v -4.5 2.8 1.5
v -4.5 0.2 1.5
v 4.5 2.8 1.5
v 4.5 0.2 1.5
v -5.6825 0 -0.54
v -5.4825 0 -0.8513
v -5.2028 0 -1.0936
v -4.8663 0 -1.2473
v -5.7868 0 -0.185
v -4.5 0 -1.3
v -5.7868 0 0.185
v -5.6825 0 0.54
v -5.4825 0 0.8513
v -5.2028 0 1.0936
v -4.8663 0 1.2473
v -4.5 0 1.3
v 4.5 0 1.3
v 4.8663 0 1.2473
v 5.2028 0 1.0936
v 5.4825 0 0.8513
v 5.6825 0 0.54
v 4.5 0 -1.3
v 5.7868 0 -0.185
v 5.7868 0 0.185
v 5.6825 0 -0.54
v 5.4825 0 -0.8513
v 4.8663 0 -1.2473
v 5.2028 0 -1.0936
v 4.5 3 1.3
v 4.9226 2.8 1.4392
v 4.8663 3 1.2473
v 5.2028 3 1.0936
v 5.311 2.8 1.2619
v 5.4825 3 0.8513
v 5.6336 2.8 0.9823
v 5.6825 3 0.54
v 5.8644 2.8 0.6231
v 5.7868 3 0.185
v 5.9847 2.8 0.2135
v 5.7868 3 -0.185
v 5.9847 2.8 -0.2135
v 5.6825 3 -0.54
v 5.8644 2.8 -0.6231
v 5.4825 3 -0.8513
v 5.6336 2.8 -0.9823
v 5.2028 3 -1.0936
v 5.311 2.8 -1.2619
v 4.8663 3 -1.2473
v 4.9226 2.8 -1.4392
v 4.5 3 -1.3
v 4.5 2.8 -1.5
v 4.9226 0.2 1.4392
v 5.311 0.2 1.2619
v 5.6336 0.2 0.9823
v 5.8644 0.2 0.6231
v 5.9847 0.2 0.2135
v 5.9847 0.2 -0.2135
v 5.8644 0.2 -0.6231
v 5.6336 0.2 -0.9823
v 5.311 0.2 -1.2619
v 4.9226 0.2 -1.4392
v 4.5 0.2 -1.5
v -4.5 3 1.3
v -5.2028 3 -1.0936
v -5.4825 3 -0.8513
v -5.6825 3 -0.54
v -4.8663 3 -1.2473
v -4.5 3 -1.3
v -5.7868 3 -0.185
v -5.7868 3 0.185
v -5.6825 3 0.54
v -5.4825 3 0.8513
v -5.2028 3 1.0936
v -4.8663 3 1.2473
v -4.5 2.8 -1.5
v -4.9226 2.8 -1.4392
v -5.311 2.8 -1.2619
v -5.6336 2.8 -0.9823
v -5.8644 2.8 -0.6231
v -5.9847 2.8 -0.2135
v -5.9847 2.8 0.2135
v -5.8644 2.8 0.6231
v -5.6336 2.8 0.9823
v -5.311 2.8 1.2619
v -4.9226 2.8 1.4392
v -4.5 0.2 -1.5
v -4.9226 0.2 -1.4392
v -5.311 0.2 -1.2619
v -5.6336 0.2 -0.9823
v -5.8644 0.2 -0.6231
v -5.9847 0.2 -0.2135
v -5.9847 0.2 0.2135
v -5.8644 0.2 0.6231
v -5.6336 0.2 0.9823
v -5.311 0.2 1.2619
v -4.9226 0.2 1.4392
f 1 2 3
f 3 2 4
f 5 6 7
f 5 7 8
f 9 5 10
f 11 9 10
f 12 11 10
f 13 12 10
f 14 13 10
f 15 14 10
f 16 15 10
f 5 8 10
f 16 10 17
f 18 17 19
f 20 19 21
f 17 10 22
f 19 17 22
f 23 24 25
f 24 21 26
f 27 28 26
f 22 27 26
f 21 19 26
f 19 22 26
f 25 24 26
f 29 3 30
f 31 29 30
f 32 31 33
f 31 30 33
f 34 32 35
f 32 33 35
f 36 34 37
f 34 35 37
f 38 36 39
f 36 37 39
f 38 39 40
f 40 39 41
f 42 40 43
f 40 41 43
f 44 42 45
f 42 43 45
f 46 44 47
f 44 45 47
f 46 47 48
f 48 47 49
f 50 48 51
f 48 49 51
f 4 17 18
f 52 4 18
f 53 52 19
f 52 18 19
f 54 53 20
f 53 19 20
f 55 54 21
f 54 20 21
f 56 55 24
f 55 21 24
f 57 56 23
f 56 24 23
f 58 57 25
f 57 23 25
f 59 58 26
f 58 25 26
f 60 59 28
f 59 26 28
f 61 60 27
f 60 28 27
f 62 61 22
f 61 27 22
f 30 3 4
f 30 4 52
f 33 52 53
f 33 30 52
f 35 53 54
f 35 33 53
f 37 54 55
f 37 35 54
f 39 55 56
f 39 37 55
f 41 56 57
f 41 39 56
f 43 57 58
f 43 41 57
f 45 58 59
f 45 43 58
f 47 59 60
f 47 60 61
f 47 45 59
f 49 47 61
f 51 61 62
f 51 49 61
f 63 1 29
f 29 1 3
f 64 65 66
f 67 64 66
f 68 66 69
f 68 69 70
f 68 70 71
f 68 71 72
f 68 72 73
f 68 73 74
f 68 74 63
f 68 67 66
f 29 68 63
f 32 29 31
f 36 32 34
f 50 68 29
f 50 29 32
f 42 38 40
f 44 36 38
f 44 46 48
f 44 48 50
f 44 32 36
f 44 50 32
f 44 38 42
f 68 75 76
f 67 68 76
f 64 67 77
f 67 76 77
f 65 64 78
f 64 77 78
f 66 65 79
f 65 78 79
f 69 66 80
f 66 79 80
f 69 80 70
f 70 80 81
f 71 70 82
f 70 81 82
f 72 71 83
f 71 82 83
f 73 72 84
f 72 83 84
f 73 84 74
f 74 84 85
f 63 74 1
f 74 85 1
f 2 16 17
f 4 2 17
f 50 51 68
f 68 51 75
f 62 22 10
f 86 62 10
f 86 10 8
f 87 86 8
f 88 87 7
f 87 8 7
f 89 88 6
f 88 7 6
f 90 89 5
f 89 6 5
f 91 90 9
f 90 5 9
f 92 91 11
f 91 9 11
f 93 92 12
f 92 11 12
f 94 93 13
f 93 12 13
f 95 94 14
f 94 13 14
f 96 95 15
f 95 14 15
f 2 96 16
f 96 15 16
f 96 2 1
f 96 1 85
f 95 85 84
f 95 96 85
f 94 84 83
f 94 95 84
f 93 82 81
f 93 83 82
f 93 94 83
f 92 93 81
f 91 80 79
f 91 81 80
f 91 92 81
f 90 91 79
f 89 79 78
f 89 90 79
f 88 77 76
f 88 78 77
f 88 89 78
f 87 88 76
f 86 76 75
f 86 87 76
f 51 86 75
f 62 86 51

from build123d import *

# Parameters (mm, degrees)
SKETCH1_W           = 12
SKETCH1_H           = 3
BOSS_EXTRUDE1_DEPTH = 3
FILLET1_RADIUS      = 1.5
FILLET1_LENGTH      = 3
FILLET2_RADIUS      = 1.5
FILLET2_LENGTH      = 3
CHAMFER2_SIZE       = 0.2


with BuildPart() as part:
    # Sketch1 → Boss-Extrude1 (new body)
    with BuildSketch(Plane(origin=(0, 0, 0), x_dir=(1, 0, 0), z_dir=(0, 1, 0))):
        Rectangle(SKETCH1_W, SKETCH1_H)
    extrude(amount=BOSS_EXTRUDE1_DEPTH)

    # Fillet1: full round fillet: the end face becomes a half cylinder, R = half its width
    fillet1_face = Plane((-6, 1.5, 0), x_dir=(0, -1, 0), z_dir=(-1, 0, 0))  # on the end face: x along it, z out of the body
    fillet1_slab = fillet1_face.offset(-FILLET1_RADIUS / 2) * Box(FILLET1_LENGTH, 2 * FILLET1_RADIUS, FILLET1_RADIUS, mode=Mode.PRIVATE)  # the body's end, R deep
    fillet1_round = Plane((-4.5, 1.5, 0), x_dir=(-1, 0, 0), z_dir=(0, -1, 0)) * Cylinder(FILLET1_RADIUS, FILLET1_LENGTH, mode=Mode.PRIVATE)  # its axis R under the face
    add(fillet1_slab - fillet1_round, mode=Mode.SUBTRACT)

    # Fillet2: full round fillet: the end face becomes a half cylinder, R = half its width
    fillet2_face = Plane((6, 1.5, 0), x_dir=(0, 1, 0), z_dir=(1, 0, 0))  # on the end face: x along it, z out of the body
    fillet2_slab = fillet2_face.offset(-FILLET2_RADIUS / 2) * Box(FILLET2_LENGTH, 2 * FILLET2_RADIUS, FILLET2_RADIUS, mode=Mode.PRIVATE)  # the body's end, R deep
    fillet2_round = Plane((4.5, 1.5, 0), x_dir=(1, 0, 0), z_dir=(0, 1, 0)) * Cylinder(FILLET2_RADIUS, FILLET2_LENGTH, mode=Mode.PRIVATE)  # its axis R under the face
    add(fillet2_slab - fillet2_round, mode=Mode.SUBTRACT)

    # Chamfer2
    chamfer2_edges = [part.edges().sort_by_distance(p)[0] for p in [
        (0, 0, 1.5),
        (0, 3, 1.5),
        (-6, 3, 0),
        (-6, 0, 0),
        (0, 0, -1.5),
        (0, 3, -1.5),
        (6, 0, 0),
        (6, 3, 0),
    ]]
    chamfer(chamfer2_edges, length=CHAMFER2_SIZE)


solid = part.part
